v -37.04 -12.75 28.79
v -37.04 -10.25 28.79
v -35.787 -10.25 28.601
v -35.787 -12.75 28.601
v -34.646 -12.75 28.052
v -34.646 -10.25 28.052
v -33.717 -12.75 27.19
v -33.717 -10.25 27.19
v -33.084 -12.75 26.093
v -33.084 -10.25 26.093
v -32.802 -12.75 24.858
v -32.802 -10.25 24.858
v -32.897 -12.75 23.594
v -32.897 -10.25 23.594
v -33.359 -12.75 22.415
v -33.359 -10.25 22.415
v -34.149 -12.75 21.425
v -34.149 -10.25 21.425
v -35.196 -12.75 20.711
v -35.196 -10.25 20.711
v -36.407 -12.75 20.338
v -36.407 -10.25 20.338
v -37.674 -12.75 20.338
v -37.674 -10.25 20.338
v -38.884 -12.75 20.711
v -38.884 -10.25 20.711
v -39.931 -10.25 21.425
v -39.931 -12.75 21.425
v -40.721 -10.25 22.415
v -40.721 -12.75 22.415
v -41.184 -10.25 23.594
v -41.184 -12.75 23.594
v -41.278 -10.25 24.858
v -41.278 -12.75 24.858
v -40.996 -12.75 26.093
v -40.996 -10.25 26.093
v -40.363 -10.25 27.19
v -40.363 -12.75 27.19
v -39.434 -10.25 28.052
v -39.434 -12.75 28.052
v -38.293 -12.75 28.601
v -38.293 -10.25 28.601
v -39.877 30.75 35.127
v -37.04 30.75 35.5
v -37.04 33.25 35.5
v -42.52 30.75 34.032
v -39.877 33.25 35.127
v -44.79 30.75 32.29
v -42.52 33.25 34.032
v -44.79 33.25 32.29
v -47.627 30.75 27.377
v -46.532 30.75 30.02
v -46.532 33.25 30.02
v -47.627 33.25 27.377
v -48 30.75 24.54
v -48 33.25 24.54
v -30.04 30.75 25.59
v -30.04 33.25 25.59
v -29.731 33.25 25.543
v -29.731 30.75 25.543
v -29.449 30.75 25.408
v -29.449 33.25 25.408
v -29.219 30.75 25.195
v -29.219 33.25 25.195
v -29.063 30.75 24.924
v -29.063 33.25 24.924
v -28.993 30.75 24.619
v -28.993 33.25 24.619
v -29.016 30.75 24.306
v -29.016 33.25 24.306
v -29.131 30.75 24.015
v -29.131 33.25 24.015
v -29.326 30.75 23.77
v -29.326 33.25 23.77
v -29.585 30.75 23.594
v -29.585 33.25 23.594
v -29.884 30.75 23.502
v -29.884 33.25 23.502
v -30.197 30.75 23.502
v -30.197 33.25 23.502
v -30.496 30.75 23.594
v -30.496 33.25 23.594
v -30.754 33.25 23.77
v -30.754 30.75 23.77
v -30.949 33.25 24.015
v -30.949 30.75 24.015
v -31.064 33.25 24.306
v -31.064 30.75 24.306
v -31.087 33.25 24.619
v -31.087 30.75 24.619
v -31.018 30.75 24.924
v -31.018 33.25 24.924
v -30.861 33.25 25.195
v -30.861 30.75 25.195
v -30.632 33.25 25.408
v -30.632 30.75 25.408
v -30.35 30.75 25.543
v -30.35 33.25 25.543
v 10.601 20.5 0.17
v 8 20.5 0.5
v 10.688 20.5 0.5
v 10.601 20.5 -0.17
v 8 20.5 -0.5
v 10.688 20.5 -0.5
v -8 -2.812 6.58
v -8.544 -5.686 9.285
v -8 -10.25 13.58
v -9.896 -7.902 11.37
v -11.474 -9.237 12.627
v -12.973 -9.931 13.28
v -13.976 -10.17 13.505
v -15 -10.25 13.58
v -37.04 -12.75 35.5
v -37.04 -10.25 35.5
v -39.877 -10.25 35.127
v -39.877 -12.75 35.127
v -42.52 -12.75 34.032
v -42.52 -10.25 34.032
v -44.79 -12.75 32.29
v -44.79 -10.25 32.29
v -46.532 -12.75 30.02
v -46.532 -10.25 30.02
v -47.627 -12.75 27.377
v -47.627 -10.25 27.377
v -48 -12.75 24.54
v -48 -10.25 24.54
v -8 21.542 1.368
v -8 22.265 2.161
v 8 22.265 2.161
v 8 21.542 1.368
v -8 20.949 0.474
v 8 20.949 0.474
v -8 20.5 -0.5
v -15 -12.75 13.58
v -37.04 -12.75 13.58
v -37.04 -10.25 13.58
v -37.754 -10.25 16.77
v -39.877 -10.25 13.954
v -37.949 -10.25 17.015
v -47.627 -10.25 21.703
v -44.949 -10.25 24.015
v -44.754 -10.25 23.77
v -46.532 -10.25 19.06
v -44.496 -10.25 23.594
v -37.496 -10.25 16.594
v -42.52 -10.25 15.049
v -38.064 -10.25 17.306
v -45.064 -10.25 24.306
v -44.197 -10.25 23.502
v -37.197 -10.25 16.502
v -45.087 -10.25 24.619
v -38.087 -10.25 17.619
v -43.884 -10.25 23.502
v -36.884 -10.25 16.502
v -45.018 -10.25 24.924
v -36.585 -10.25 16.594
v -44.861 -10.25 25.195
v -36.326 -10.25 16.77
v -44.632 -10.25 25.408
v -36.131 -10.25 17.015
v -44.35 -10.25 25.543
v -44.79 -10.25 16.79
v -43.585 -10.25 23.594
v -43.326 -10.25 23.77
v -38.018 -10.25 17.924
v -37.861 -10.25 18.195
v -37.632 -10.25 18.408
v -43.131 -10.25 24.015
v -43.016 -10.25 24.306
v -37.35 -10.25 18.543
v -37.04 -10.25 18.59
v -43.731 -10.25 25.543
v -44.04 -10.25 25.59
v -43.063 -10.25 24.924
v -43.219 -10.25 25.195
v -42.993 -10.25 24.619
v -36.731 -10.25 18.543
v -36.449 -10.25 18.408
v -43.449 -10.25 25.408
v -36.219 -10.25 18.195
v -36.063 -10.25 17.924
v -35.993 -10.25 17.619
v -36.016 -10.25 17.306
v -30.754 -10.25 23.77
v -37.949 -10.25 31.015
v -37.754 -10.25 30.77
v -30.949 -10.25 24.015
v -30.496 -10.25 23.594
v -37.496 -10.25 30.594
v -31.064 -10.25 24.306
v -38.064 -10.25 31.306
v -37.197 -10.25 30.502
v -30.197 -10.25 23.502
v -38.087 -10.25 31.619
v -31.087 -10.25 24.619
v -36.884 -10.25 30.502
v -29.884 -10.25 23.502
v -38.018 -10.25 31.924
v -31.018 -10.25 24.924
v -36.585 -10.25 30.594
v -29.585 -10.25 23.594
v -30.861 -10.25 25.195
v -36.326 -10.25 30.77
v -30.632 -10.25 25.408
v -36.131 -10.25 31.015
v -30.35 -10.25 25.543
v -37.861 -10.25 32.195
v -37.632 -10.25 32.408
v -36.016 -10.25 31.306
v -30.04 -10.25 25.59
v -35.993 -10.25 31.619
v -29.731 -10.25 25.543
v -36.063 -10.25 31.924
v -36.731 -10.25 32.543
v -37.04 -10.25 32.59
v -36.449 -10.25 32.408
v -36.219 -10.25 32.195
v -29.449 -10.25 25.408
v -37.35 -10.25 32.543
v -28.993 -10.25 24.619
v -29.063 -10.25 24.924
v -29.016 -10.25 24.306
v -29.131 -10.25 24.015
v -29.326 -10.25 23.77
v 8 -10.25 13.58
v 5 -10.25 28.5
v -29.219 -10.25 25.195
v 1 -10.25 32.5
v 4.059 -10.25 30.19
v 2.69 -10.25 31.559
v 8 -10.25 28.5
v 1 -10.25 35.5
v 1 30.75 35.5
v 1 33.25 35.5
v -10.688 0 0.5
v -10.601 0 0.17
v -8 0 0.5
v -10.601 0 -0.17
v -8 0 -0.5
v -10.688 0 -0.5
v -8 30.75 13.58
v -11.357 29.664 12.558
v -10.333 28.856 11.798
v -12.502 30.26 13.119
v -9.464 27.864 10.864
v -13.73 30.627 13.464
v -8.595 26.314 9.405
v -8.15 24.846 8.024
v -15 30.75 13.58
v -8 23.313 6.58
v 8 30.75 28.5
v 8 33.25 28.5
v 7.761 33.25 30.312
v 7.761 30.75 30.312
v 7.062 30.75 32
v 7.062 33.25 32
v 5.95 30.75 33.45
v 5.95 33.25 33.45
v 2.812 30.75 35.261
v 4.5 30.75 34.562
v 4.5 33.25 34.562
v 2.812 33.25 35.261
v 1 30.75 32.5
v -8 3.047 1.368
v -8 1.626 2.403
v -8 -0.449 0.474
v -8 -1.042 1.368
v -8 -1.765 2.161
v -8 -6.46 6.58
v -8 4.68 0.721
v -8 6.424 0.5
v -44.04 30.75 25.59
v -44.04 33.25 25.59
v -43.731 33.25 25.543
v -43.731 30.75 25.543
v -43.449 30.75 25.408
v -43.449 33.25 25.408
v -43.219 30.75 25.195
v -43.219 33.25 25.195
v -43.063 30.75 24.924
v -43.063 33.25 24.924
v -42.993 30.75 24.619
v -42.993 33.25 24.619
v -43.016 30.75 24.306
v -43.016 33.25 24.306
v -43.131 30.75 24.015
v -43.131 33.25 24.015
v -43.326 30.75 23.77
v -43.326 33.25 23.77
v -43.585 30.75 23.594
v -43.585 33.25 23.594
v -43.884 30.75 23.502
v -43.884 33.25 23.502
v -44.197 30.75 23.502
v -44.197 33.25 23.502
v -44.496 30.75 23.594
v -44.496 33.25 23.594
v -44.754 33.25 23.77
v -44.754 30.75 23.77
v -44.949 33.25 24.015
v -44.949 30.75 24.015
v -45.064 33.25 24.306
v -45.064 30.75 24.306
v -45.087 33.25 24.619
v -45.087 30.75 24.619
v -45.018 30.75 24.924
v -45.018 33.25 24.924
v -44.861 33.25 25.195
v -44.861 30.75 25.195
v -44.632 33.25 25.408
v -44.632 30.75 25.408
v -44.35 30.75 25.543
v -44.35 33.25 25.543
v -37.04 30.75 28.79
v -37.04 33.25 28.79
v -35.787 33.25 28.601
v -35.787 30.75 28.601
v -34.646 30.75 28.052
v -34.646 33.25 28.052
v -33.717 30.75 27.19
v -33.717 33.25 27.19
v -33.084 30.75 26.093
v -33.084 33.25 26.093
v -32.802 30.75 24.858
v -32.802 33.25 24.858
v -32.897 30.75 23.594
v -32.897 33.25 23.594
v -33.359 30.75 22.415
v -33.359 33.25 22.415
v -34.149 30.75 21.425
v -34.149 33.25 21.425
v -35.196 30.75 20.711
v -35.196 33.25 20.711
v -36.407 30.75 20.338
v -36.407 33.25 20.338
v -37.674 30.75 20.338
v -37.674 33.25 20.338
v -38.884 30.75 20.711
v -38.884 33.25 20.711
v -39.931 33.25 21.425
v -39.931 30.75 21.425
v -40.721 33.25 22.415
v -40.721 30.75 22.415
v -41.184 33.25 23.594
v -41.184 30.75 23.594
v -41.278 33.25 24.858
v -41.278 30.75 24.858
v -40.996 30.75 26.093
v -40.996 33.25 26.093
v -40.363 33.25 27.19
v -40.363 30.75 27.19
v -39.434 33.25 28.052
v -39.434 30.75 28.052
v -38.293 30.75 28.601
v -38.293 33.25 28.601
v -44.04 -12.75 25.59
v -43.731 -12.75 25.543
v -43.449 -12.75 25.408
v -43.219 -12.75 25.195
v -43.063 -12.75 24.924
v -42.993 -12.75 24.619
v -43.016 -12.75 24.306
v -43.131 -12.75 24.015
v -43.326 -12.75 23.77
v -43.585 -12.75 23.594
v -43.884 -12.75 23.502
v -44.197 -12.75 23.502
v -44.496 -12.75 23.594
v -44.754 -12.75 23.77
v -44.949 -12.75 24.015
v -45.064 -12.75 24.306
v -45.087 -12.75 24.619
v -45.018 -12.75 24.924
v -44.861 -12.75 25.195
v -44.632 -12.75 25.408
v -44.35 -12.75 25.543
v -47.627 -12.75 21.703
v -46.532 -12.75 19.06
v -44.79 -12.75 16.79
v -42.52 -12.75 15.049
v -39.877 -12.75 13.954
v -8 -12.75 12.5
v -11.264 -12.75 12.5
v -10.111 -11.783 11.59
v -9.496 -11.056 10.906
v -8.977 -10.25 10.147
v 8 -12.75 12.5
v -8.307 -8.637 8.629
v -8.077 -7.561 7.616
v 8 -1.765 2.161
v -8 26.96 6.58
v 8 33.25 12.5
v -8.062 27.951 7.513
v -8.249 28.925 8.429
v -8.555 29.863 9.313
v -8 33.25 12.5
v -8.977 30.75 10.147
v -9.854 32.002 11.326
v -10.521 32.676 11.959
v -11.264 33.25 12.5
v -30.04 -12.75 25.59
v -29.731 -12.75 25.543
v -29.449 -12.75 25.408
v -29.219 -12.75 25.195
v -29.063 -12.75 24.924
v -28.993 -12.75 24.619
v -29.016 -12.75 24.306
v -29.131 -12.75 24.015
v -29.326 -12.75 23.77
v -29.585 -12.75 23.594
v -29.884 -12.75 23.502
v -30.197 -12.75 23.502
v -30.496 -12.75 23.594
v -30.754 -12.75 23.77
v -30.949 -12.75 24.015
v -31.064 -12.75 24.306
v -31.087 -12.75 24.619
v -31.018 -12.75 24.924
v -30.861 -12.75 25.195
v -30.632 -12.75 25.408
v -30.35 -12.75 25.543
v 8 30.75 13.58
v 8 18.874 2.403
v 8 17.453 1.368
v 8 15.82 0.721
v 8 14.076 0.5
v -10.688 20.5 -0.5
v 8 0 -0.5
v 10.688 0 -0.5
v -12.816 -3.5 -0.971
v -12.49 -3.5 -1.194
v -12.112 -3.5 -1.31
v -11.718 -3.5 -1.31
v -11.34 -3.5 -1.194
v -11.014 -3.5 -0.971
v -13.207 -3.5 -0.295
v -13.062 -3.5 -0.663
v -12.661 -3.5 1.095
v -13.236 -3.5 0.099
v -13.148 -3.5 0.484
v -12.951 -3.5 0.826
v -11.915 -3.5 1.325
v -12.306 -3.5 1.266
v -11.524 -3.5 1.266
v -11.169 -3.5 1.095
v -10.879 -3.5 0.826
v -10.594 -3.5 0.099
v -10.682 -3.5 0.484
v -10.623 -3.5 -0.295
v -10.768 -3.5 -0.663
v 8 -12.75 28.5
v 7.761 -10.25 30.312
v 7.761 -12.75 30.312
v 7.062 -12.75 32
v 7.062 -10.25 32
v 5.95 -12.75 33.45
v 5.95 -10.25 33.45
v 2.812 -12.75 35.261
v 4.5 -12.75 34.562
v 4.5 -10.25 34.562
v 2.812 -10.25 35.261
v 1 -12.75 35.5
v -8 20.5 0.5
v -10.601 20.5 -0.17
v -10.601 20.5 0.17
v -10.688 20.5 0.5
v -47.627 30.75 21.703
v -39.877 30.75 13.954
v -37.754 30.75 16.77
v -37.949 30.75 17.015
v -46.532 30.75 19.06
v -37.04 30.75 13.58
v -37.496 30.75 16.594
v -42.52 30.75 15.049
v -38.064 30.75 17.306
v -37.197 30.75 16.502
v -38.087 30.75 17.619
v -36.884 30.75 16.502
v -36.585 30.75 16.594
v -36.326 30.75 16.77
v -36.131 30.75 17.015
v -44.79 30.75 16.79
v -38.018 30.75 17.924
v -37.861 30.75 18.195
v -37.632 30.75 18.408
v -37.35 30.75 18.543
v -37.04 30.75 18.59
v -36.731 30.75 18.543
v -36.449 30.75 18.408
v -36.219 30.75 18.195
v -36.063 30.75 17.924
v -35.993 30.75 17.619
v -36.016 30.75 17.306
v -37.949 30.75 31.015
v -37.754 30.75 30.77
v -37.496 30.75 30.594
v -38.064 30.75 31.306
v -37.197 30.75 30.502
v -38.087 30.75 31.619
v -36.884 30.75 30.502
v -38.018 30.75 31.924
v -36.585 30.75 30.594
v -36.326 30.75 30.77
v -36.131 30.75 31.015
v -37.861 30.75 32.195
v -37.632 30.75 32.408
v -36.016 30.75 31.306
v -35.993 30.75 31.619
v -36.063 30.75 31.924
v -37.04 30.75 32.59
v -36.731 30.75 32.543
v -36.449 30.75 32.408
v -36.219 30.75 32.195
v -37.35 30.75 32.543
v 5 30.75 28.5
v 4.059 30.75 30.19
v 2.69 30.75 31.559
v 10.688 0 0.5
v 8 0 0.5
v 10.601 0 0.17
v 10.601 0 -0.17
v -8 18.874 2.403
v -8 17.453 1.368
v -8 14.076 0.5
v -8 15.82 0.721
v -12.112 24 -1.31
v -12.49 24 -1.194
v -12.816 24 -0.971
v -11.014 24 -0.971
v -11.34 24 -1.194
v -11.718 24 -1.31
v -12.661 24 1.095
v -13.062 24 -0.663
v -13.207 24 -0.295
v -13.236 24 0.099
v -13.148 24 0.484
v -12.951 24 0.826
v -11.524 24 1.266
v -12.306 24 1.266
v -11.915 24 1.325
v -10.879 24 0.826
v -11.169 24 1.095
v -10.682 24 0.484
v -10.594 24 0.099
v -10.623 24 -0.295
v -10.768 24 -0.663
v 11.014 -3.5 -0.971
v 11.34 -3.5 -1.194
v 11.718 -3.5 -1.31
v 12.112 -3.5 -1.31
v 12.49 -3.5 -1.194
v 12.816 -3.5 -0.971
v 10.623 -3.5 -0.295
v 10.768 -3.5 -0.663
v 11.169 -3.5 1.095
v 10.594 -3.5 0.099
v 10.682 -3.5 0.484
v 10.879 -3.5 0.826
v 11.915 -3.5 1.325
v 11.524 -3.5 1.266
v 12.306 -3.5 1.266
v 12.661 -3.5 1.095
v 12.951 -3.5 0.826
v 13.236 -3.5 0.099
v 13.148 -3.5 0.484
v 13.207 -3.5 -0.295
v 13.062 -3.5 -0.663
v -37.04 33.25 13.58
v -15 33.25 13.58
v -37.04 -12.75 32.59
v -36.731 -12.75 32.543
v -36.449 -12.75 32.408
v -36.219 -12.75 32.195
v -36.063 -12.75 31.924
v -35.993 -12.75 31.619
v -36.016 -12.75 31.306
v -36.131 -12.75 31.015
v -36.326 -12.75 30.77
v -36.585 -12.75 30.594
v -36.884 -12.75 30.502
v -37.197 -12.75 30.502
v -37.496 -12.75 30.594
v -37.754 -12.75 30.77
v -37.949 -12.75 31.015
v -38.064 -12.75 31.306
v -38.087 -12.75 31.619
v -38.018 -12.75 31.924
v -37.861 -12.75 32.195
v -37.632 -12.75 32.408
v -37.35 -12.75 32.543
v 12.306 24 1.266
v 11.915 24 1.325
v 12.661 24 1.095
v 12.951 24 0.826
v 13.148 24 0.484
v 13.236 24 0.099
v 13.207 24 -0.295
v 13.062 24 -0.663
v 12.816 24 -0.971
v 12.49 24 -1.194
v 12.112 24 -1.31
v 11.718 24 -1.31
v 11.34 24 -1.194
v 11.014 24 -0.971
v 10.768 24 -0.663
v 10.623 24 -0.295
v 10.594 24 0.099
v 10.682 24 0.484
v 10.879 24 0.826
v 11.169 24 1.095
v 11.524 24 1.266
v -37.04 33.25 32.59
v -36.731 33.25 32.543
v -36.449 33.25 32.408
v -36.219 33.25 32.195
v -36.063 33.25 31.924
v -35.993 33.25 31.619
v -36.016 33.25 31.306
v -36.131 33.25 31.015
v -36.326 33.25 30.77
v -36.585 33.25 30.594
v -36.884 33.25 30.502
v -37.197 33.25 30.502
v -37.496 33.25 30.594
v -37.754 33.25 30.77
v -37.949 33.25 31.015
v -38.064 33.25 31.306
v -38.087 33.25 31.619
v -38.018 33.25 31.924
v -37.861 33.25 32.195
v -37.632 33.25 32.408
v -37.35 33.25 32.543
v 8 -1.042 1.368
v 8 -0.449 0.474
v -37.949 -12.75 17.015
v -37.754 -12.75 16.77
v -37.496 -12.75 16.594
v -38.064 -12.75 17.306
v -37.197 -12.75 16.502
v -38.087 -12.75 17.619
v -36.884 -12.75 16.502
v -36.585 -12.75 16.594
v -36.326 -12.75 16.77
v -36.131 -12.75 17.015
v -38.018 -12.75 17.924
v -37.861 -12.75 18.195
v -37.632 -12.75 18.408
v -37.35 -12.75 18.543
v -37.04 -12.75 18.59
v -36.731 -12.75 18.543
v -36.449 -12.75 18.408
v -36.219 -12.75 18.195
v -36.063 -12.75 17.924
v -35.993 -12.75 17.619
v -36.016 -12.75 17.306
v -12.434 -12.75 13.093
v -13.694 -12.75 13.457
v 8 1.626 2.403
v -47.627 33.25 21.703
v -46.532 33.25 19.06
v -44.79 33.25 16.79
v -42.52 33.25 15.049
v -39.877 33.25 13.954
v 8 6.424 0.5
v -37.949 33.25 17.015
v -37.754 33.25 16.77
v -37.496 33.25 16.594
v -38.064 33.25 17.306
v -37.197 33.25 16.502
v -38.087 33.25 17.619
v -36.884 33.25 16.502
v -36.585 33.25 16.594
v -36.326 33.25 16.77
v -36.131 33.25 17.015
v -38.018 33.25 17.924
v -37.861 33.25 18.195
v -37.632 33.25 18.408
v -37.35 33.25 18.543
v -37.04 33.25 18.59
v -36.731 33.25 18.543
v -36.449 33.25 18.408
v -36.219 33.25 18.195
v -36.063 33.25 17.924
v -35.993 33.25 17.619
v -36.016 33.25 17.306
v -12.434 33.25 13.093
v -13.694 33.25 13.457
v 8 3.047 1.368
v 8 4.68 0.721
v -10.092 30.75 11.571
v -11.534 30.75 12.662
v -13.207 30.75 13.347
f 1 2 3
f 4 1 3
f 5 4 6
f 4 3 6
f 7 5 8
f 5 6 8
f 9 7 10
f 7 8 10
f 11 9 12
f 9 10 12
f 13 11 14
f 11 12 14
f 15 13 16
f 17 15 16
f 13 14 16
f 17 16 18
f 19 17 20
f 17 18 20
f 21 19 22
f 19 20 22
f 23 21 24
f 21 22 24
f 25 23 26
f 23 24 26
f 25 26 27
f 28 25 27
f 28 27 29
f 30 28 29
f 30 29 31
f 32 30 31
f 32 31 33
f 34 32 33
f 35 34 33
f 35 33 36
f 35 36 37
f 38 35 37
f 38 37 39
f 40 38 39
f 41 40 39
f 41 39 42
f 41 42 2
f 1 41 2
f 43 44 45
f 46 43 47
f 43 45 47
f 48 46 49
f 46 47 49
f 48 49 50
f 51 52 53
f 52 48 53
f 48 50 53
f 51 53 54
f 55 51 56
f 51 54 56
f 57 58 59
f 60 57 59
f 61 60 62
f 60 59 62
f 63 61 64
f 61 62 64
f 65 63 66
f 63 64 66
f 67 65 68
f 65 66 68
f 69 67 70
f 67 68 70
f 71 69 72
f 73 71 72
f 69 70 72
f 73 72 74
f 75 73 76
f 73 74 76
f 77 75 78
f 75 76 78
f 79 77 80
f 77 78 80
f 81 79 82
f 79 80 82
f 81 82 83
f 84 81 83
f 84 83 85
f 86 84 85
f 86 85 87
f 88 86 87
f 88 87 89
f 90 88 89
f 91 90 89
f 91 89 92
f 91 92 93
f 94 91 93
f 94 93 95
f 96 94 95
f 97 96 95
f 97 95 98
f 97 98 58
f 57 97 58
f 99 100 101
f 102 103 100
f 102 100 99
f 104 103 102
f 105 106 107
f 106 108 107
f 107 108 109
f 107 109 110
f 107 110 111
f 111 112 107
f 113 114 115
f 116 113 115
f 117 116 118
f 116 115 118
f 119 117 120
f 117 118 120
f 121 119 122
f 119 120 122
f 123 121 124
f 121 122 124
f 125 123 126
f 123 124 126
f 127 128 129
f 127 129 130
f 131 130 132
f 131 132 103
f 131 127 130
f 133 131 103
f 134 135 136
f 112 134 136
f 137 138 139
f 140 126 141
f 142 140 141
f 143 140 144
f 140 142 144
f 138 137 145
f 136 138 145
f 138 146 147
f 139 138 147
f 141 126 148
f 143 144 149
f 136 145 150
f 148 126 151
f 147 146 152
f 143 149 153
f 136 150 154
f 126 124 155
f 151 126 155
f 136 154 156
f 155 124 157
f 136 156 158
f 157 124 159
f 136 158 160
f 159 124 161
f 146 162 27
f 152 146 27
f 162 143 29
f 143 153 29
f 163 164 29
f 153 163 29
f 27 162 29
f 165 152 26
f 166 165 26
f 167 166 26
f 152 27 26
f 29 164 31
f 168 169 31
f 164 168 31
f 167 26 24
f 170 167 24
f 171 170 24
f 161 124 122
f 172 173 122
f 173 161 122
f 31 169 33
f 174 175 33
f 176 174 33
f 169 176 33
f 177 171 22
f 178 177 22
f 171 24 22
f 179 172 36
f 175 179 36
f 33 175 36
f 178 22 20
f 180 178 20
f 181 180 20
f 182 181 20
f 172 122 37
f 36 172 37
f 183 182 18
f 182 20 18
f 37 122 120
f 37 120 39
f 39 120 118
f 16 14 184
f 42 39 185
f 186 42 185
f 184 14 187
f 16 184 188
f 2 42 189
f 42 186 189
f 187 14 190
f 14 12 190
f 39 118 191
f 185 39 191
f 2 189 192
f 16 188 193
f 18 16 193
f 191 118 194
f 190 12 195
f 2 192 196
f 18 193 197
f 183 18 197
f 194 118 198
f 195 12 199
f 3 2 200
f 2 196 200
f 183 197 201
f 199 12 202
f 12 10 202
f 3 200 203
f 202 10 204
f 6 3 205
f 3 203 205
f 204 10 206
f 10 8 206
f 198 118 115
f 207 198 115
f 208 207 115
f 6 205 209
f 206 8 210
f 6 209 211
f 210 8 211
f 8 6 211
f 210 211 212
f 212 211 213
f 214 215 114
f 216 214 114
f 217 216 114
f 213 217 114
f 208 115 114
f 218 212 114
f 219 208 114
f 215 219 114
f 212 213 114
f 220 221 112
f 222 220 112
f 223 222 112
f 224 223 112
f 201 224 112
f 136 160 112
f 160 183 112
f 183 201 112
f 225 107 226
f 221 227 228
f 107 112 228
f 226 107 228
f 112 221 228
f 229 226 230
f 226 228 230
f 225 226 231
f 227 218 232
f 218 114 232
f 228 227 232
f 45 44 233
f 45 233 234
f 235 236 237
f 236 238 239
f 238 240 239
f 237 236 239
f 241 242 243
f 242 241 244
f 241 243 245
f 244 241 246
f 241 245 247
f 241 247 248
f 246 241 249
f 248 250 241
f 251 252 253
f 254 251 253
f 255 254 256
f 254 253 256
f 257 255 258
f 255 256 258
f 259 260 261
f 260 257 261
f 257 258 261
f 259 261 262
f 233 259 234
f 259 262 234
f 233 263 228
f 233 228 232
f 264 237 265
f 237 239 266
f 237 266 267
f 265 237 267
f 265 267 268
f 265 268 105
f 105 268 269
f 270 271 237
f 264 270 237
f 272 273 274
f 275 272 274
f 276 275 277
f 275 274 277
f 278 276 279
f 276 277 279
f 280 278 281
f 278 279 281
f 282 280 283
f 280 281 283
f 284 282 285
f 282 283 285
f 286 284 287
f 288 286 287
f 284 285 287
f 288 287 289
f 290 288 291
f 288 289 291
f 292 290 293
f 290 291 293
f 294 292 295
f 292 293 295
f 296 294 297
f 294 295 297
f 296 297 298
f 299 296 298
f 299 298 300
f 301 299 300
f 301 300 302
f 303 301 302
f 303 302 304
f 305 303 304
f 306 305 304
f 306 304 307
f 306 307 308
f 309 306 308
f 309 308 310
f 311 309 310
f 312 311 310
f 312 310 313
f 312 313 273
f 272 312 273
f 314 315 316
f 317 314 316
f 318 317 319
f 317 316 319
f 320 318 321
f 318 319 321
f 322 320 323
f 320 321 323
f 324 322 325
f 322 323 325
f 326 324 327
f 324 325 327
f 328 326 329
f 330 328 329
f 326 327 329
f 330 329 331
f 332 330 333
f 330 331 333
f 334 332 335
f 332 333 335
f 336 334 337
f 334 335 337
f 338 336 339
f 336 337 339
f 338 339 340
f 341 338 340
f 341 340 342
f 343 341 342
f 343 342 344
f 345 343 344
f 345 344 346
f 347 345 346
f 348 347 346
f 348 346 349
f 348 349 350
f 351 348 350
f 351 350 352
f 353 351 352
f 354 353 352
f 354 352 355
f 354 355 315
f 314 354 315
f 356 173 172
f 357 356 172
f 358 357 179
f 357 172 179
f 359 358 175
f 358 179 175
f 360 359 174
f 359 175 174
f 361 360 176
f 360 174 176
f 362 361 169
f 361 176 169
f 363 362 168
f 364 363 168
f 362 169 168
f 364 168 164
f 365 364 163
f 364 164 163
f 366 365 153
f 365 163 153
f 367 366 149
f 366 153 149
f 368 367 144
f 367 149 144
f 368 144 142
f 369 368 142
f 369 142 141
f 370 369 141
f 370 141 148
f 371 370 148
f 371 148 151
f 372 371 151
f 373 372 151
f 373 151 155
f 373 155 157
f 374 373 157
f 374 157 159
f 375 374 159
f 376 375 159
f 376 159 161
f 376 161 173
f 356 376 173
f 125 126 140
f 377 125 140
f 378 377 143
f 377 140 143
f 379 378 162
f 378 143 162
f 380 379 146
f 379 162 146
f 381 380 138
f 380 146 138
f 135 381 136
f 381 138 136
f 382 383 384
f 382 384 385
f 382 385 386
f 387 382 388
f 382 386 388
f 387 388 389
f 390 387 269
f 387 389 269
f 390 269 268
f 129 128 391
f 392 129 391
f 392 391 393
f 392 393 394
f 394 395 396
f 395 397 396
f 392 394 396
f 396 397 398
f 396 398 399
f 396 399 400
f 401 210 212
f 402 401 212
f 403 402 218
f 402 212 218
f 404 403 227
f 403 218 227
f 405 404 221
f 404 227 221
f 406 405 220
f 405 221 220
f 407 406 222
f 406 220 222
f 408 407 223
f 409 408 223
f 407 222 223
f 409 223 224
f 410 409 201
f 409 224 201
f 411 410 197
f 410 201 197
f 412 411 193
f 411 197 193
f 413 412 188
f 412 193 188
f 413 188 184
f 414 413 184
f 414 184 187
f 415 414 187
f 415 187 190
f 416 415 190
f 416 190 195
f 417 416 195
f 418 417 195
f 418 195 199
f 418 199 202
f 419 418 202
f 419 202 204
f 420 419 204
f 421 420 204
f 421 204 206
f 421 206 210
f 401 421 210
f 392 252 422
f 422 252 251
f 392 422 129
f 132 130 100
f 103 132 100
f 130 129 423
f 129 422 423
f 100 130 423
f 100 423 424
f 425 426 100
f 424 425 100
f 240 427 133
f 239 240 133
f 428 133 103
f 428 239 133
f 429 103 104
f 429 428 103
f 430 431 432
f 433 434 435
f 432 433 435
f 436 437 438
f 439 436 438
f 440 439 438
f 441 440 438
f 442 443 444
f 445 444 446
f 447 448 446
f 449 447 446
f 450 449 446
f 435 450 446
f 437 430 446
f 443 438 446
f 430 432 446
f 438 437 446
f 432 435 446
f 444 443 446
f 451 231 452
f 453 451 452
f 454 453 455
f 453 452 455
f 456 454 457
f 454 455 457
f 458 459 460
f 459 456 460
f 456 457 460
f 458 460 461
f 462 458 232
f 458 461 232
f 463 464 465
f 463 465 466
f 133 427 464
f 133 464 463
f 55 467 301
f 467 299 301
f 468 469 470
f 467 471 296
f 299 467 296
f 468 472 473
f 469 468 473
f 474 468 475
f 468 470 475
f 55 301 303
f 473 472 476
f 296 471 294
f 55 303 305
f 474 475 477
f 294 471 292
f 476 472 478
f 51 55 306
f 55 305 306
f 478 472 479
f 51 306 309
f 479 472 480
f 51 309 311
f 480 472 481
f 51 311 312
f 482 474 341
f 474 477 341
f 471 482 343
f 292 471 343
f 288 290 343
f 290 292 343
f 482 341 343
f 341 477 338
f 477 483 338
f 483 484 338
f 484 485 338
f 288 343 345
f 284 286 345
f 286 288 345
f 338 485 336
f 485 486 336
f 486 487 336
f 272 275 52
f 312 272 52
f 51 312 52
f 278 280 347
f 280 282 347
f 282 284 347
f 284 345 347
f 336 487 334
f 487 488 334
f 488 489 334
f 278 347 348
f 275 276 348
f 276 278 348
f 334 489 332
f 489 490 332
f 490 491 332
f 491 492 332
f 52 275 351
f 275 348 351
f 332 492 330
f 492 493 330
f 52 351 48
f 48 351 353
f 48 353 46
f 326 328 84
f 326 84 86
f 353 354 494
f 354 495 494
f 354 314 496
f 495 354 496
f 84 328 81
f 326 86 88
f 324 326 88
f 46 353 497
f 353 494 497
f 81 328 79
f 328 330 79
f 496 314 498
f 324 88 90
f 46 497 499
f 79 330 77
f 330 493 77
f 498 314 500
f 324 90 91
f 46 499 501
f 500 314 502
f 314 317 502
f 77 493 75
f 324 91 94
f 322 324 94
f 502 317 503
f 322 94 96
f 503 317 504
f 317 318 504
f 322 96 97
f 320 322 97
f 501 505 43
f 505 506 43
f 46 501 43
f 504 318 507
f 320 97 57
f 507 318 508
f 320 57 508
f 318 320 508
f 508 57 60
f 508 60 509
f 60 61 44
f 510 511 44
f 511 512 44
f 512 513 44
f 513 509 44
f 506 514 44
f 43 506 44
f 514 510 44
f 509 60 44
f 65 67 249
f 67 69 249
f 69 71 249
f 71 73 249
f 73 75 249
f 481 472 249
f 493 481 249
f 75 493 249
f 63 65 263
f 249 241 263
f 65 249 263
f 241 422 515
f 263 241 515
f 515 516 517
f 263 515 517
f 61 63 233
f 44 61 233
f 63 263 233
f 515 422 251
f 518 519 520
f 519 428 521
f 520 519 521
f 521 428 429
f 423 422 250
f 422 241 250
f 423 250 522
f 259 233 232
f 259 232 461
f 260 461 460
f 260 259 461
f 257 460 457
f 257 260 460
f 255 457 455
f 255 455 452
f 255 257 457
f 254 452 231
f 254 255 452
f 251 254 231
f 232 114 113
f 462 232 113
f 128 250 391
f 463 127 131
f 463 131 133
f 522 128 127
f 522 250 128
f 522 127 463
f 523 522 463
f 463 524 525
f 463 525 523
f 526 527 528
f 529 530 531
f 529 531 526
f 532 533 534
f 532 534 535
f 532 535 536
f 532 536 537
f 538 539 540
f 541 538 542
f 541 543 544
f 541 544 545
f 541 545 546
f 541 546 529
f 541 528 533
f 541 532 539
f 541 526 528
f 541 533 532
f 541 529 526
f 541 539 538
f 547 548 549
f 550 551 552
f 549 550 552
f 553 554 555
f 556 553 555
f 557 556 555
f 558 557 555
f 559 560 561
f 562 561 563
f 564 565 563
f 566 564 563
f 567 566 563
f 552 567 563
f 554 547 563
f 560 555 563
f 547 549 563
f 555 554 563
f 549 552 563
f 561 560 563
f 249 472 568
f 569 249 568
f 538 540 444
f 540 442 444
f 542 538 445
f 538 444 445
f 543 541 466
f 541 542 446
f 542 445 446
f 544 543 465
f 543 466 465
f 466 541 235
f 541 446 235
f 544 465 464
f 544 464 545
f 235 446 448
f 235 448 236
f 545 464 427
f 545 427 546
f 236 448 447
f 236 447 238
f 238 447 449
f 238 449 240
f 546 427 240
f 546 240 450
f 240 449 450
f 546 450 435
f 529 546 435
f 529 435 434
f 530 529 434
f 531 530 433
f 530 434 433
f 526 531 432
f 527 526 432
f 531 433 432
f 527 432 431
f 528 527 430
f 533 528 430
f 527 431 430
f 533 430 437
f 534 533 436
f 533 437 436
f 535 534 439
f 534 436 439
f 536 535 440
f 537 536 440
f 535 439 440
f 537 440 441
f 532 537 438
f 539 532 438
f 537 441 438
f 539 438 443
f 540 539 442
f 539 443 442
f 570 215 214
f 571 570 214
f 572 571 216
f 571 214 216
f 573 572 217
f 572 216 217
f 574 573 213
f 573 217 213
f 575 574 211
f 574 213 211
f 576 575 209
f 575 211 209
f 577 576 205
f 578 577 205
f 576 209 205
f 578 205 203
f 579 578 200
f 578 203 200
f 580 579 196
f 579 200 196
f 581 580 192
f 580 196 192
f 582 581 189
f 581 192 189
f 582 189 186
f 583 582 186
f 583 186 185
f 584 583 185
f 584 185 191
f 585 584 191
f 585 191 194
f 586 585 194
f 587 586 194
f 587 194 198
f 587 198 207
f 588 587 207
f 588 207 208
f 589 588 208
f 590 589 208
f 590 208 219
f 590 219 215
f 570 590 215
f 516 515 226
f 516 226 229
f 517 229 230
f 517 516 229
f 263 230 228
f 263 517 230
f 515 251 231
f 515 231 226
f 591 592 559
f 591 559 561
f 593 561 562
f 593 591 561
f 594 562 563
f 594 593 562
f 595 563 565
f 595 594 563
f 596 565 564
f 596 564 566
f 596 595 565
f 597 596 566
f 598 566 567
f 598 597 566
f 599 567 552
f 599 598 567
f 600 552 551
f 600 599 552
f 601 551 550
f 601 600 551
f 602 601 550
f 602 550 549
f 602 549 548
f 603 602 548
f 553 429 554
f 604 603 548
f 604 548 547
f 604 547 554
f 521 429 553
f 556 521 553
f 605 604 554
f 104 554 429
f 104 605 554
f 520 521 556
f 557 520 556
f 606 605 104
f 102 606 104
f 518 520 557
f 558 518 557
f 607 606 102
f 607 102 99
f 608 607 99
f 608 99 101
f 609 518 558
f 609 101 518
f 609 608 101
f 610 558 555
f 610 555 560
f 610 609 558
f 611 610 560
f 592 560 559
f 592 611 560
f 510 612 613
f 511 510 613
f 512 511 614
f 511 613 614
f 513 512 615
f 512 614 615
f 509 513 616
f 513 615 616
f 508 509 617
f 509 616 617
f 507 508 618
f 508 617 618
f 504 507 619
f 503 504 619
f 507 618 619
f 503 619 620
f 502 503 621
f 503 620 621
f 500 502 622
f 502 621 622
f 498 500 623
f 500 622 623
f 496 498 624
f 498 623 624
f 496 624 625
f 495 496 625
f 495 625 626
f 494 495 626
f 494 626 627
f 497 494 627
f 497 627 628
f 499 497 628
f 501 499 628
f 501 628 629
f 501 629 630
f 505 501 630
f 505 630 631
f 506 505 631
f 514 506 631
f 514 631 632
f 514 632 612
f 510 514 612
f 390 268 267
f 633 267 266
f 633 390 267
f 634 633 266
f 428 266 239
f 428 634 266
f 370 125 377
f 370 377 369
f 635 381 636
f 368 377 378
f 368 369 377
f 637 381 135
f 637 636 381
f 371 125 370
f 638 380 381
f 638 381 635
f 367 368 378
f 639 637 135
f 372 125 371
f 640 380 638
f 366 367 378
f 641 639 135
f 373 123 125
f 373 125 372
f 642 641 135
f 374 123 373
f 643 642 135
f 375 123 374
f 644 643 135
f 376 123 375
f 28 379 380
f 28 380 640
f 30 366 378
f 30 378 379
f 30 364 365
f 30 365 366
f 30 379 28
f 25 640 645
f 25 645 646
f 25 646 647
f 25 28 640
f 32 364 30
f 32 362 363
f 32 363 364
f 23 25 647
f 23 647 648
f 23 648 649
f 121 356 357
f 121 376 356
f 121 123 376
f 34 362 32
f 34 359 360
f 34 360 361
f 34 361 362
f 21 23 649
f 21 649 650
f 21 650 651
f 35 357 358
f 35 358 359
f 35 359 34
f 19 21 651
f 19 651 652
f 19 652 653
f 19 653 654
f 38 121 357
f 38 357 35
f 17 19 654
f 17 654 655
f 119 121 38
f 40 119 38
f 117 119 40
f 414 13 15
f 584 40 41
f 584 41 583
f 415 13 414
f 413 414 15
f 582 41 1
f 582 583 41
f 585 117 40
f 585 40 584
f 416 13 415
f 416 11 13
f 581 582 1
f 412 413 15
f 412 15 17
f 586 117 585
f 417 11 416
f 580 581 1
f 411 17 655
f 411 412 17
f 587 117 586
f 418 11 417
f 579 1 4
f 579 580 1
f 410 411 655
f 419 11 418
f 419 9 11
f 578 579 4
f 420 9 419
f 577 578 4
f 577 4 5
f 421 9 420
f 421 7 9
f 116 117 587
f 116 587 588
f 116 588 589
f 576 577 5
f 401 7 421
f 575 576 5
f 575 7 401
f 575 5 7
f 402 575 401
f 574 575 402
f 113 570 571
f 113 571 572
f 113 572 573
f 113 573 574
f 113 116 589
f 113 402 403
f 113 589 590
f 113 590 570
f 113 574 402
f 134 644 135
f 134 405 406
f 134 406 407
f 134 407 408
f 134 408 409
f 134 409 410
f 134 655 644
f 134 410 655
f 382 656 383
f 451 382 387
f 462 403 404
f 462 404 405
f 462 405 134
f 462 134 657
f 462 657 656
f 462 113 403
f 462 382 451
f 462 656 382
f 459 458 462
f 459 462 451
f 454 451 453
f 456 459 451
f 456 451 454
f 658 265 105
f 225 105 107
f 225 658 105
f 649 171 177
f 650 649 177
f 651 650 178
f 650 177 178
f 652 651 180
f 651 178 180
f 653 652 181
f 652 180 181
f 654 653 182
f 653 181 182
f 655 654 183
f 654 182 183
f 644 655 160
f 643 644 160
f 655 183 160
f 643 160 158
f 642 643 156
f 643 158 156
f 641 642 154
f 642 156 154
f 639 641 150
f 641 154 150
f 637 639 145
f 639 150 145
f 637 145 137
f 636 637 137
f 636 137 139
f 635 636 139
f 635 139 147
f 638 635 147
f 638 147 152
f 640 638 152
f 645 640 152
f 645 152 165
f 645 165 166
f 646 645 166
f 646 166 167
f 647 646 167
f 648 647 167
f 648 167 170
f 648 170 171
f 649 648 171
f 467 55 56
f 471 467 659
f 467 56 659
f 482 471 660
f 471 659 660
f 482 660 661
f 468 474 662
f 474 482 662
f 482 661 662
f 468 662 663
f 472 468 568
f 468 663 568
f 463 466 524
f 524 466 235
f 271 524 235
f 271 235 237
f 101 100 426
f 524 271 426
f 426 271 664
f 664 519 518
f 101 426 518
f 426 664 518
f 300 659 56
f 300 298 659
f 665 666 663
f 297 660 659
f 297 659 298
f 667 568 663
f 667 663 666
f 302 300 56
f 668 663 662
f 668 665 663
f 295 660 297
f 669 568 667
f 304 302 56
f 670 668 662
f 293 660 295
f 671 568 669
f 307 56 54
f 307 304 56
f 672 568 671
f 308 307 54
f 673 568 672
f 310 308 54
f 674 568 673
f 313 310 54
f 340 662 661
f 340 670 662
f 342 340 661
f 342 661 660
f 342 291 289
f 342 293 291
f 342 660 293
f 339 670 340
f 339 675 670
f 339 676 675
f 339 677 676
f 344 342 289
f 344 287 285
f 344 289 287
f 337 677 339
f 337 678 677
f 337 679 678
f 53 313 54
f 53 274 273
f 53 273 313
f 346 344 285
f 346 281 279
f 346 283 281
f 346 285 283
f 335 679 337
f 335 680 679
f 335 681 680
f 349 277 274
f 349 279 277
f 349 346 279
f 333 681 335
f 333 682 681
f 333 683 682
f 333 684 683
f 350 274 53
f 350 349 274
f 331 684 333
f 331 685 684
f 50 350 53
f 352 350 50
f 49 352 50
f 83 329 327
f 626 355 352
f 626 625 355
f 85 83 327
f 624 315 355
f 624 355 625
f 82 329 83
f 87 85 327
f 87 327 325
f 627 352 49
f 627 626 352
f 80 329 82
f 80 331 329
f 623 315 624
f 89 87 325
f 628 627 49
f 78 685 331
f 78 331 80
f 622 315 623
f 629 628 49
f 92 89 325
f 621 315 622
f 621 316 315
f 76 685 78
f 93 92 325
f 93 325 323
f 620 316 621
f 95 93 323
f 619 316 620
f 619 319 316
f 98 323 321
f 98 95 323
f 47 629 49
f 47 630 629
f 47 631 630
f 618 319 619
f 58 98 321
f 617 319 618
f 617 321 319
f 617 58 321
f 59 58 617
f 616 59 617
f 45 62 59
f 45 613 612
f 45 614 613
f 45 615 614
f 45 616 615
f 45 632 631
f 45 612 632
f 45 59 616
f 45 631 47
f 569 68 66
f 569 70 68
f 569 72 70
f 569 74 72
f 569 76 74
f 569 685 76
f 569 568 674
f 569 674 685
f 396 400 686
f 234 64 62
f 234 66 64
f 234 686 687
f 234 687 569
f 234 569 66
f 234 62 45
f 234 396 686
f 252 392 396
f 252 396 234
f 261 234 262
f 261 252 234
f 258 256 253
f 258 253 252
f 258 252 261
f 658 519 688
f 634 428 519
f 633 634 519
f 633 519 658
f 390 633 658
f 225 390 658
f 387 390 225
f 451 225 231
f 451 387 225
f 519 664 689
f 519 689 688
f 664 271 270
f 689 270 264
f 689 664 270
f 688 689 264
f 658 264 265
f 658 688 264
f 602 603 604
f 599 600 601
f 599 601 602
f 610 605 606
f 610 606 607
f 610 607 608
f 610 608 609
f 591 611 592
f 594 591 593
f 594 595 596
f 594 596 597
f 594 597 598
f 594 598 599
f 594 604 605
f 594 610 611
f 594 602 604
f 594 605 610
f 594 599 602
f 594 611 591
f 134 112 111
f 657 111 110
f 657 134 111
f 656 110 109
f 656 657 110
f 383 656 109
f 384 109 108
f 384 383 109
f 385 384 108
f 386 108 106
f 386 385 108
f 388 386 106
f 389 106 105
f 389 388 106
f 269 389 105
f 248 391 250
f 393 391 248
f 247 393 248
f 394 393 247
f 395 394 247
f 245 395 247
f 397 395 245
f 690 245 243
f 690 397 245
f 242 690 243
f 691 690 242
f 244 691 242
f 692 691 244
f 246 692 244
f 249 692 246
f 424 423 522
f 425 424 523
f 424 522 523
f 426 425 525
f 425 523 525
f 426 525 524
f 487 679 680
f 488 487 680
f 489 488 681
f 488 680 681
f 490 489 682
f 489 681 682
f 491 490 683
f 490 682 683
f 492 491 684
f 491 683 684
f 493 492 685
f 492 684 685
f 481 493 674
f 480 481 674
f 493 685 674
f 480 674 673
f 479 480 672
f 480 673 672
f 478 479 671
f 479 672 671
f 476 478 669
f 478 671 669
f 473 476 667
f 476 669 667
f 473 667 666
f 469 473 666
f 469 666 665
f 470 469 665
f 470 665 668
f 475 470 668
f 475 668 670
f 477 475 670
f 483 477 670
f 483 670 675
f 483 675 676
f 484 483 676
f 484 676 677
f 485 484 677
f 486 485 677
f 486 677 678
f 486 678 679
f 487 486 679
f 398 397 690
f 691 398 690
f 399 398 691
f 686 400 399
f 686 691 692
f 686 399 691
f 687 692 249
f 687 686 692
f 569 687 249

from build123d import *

# Parameters (mm, degrees)
SKETCH1_W           = 23.83
SKETCH1_H           = 1
BOSS_EXTRUDE1_DEPTH = 20.5
SKETCH2_R           = 1.325
BOSS_EXTRUDE2_DEPTH = 13.75
BOSS_EXTRUDE4_DEPTH = 8
SKETCH5_W           = 21.919818374
SKETCH5_H           = 2.5
BOSS_EXTRUDE5_DEPTH = 40
SKETCH6_R           = 4.25
SKETCH6_R_2         = 1.05
CUT_EXTRUDE1_DEPTH  = 76.367433285
FILLET1_R           = 7
FILLET2_R           = 7
FILLET3_R           = 7
BOSS_EXTRUDE6_START = 41
BOSS_EXTRUDE6_DEPTH = 41


with BuildPart() as part:
    # Sketch1 → Boss-Extrude1 (new body)
    with BuildSketch(Plane(origin=(0, 0, 0), x_dir=(1, 0, 0), z_dir=(0, 1, 0))):
        Rectangle(SKETCH1_W, SKETCH1_H)
    extrude(amount=BOSS_EXTRUDE1_DEPTH)

    # Sketch2 → Boss-Extrude2 (add, symmetric)
    with BuildSketch(Plane(origin=(0, 10.25, 0), x_dir=(1, 0, 0), z_dir=(0, 1, 0))):
        with Locations(Location((-11.915, 0, 0), (0, 0, 270))):
            Circle(SKETCH2_R)
        with Locations(Location((11.915, 0, 0), (0, 0, 270))):
            Circle(SKETCH2_R)
    extrude(amount=BOSS_EXTRUDE2_DEPTH, both=True)

    # Sketch4 → Boss-Extrude4 (add, symmetric)
    with BuildSketch(Plane(origin=(0, 0, 0), x_dir=(0, 0, -1), z_dir=(1, 0, 0))):
        Polygon((-0.5, 16.852307022), (-0.5, 20.5), (-12.5, 33.25), (-35.5, 33.25), (-35.5, 30.75), (-13.580181626, 30.75), align=None)
        Polygon((-0.5, 0), (-0.5, 3.647692978), (-13.580181626, -10.25), (-35.5, -10.25), (-35.5, -12.75), (-12.5, -12.75), align=None)
    extrude(amount=BOSS_EXTRUDE4_DEPTH, both=True)

    # Sketch5 → Boss-Extrude5 (add)
    with BuildSketch(Plane.ZY.offset(8)):
        with Locations((24.540090813, 32)):
            Rectangle(SKETCH5_W, SKETCH5_H)
        with Locations((24.540090813, -11.5)):
            Rectangle(SKETCH5_W, SKETCH5_H)
    extrude(amount=BOSS_EXTRUDE5_DEPTH)

    # Sketch6 → Cut-Extrude1 (cut, through all)
    with BuildSketch(Plane(origin=(0, 33.25, 0), x_dir=(1, 0, 0), z_dir=(0, 1, 0))):
        with Locations(Location((-37.040090813, -24.540090813, 0), (0, 0, 270))):
            Circle(SKETCH6_R)
        with Locations(Location((-44.040090813, -24.540090813, 0), (0, 0, 270))):
            Circle(SKETCH6_R_2)
        with Locations(Location((-37.040090813, -17.540090813, 0), (0, 0, 270))):
            Circle(SKETCH6_R_2)
        with Locations(Location((-30.040090813, -24.540090813, 0), (0, 0, 270))):
            Circle(SKETCH6_R_2)
        with Locations(Location((-37.040090813, -31.540090813, 0), (0, 0, 270))):
            Circle(SKETCH6_R_2)
        with BuildLine():
            ThreePointArc((-48, -24.540090813), (-44.78991692, -16.790264706), (-37.040090813, -13.580181626))
            Line((-37.040090813, -13.580181626), (-48, -13.580181626))
            Line((-48, -13.580181626), (-48, -24.540090813))
        make_face()
        with BuildLine():
            ThreePointArc((-37.040090813, -35.5), (-44.78991692, -32.28991692), (-48, -24.540090813))
            Line((-48, -24.540090813), (-48, -35.5))
            Line((-48, -35.5), (-37.040090813, -35.5))
        make_face()
    extrude(amount=-CUT_EXTRUDE1_DEPTH, mode=Mode.SUBTRACT)

    # Fillet1
    # the kernel refuses this fillet: 7 mm, written as the material it adds along each edge
    with BuildSketch(Plane(origin=(-8, -12.75, 13.580181626), x_dir=(-1, 0, 0), z_dir=(0, 1, 0))) as fillet1_piece_1_section:
        with BuildLine():
            CenterArc((FILLET1_R, -FILLET1_R), FILLET1_R, 90, 90)
            Line((0, -FILLET1_R), (0, 0))
            Line((0, 0), (FILLET1_R, 0))
        make_face()
    fillet1_piece_1 = extrude(amount=2.5, mode=Mode.PRIVATE)
    fillet1_piece_1 = split(fillet1_piece_1, bisect_by=Plane(origin=(-10.020174451, -12.153760937, 11.938833823), z_dir=(0, 0.6853646990049913, 0.7281999926928027)), keep=Keep.TOP, mode=Mode.PRIVATE)
    fillet1_piece_1 = split(fillet1_piece_1, bisect_by=Plane(origin=(-10.020174451, -10.440349189, 13.759333804), z_dir=(0, -0.685364699004991, -0.7281999926928029)), keep=Keep.TOP, mode=Mode.PRIVATE)
    add(fillet1_piece_1)
    with BuildSketch(Plane(origin=(-8, -12.75, 13.580181626), x_dir=(-1, 0, 0), z_dir=(0, 1, 0))) as fillet1_piece_2_section:
        with BuildLine():
            CenterArc((FILLET1_R, -FILLET1_R), FILLET1_R, 90, 90)
            Line((0, -FILLET1_R), (0, 0))
            Line((0, 0), (FILLET1_R, 0))
        make_face()
    fillet1_piece_2 = extrude(amount=20, mode=Mode.PRIVATE)
    fillet1_piece_2 = split(fillet1_piece_2, bisect_by=Plane(origin=(-8.816209607, -9.698679662, 9.628169093), z_dir=(0, 0.6853646990049913, 0.7281999926928027)), keep=Keep.TOP, mode=Mode.PRIVATE)
    fillet1_piece_2 = split(fillet1_piece_2, bisect_by=Plane(origin=(-8.816209607, -10.25, 10.809130305), z_dir=(0, 1, 0)), keep=Keep.TOP, mode=Mode.PRIVATE)
    fillet1_piece_2 = split(fillet1_piece_2, bisect_by=Plane(origin=(-8.816209607, -7.985267914, 11.448669075), z_dir=(0, -0.685364699004991, -0.7281999926928029)), keep=Keep.TOP, mode=Mode.PRIVATE)
    add(fillet1_piece_2)
    with BuildSketch(Plane(origin=(-8, 33.25, 13.580181626), x_dir=(0, 0, -1), z_dir=(0, -1, 0))) as fillet1_piece_3_section:
        with BuildLine():
            CenterArc((FILLET1_R, -FILLET1_R), FILLET1_R, 90, 90)
            Line((0, -FILLET1_R), (0, 0))
            Line((0, 0), (FILLET1_R, 0))
        make_face()
    fillet1_piece_3 = extrude(amount=2.5, mode=Mode.PRIVATE)
    fillet1_piece_3 = split(fillet1_piece_3, bisect_by=Plane(origin=(-10.020174451, 32.653760936, 11.938833823), z_dir=(0, -0.6853646990049912, 0.7281999926928028)), keep=Keep.TOP, mode=Mode.PRIVATE)
    fillet1_piece_3 = split(fillet1_piece_3, bisect_by=Plane(origin=(-10.020174451, 30.940349189, 13.759333804), z_dir=(0, 0.6853646990049909, -0.7281999926928031)), keep=Keep.TOP, mode=Mode.PRIVATE)
    add(fillet1_piece_3)
    with BuildSketch(Plane(origin=(-8, 33.25, 13.580181626), x_dir=(0, 0, -1), z_dir=(0, -1, 0))) as fillet1_piece_4_section:
        with BuildLine():
            CenterArc((FILLET1_R, -FILLET1_R), FILLET1_R, 90, 90)
            Line((0, -FILLET1_R), (0, 0))
            Line((0, 0), (FILLET1_R, 0))
        make_face()
    fillet1_piece_4 = extrude(amount=20, mode=Mode.PRIVATE)
    fillet1_piece_4 = split(fillet1_piece_4, bisect_by=Plane(origin=(-8.816209616, 30.198679665, 9.628169097), z_dir=(0, -0.6853646990049912, 0.7281999926928028)), keep=Keep.TOP, mode=Mode.PRIVATE)
    fillet1_piece_4 = split(fillet1_piece_4, bisect_by=Plane(origin=(-8.816209616, 28.485267918, 11.448669078), z_dir=(0, 0.6853646990049909, -0.7281999926928031)), keep=Keep.TOP, mode=Mode.PRIVATE)
    fillet1_piece_4 = split(fillet1_piece_4, bisect_by=Plane(origin=(-8.816209616, 30.75, 10.809130308), z_dir=(0, -1, 0)), keep=Keep.TOP, mode=Mode.PRIVATE)
    add(fillet1_piece_4)
    # the kernel refuses this fillet: 7 mm, written as the material it takes off along each edge
    with BuildSketch(Plane(origin=(8, 7.25, 35.5), x_dir=(0, 0, -1), z_dir=(0, -1, 0))) as fillet1_2_piece_1:
        with BuildLine():
            CenterArc((FILLET1_R, -FILLET1_R), FILLET1_R, 90, 90)
            Line((0, -FILLET1_R), (0, 0))
            Line((0, 0), (FILLET1_R, 0))
        make_face()
    extrude(amount=37.5, mode=Mode.SUBTRACT)
    with BuildSketch(Plane(origin=(8, 50.75, 35.5), x_dir=(-1, 0, 0), z_dir=(0, -1, 0))) as fillet1_2_piece_2:
        with BuildLine():
            CenterArc((FILLET1_R, FILLET1_R), FILLET1_R, 180, 90)
            Line((0, FILLET1_R), (0, 0))
            Line((0, 0), (FILLET1_R, 0))
        make_face()
    extrude(amount=37.5, mode=Mode.SUBTRACT)

    # Fillet2
    fillet2_edges = [part.edges().sort_by_distance(p)[0] for p in [
        (0, 16.852307022, 0.5),
        (0, 3.647692978, 0.5),
    ]]
    fillet(fillet2_edges, radius=FILLET2_R)

    # Fillet3
    # the kernel refuses this fillet: 7 mm, written as the material it adds along each edge
    with BuildSketch(Plane(origin=(-8, 20.5, 0.5), x_dir=(0, 0.7281999926925888, 0.6853646990052185), z_dir=(1, 0, 0))) as fillet3_piece_1:
        with BuildLine():
            CenterArc((2.423417163, -7), FILLET3_R, 90, 26.366519243)
            Line((-0.685364699, -0.728199993), (0, 0))
            Line((0, 0), (2.423417163, 0))
        make_face()
    extrude(amount=16)
    with BuildSketch(Plane(origin=(8, 0, 0.5), x_dir=(0, 0, -1), z_dir=(-1, 0, 0))) as fillet3_piece_2:
        with BuildLine():
            CenterArc((3.436475374, 6.562285254), FILLET3_R, 223.264295411, 26.366519243)
            Line((-1.660924575, 1.764732361), (0, 0))
            Line((0, 0), (1, 0))
        make_face()
    extrude(amount=16)

    # Sketch8 → Boss-Extrude6 (add)
    with BuildSketch(Plane(origin=(0, -10.25, 0), x_dir=(1, 0, 0), z_dir=(0, 1, 0)).offset(BOSS_EXTRUDE6_START)):
        with BuildLine():
            ThreePointArc((1, -35.5), (5.949747468, -33.449747468), (8, -28.5))
            Line((8, -28.5), (5, -28.5))
            ThreePointArc((5, -28.5), (3.422054899, -30.922054899), (1, -32.5))
            Line((1, -32.5), (1, -35.5))
        make_face()
    extrude(amount=-BOSS_EXTRUDE6_DEPTH)


solid = part.part
